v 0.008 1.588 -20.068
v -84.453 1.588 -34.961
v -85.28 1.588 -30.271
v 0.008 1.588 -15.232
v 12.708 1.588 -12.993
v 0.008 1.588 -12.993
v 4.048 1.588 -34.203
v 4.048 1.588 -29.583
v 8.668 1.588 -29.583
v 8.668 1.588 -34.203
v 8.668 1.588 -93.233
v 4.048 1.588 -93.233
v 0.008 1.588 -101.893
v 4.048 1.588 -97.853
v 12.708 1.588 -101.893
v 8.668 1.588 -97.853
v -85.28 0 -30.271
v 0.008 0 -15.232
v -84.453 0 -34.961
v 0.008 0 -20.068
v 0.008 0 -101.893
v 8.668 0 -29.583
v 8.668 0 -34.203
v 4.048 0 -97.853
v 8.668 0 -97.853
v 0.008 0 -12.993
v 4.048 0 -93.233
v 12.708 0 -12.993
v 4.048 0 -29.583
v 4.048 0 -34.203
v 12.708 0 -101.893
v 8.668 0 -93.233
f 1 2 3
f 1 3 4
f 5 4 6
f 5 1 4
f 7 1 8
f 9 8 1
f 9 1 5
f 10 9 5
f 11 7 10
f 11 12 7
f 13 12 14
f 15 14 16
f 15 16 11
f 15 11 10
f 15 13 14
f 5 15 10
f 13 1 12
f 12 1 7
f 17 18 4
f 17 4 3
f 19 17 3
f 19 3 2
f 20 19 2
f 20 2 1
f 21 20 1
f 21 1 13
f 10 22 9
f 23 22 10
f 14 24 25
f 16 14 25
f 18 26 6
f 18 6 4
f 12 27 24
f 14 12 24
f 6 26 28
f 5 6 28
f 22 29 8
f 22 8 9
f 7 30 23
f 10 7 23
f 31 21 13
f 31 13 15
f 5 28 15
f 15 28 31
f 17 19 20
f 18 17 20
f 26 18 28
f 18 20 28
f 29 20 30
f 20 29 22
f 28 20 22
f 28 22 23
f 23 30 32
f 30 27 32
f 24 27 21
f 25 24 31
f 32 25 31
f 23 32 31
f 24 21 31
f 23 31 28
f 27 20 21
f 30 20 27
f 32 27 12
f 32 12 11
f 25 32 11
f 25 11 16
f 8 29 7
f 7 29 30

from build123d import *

# Parameters (mm, degrees)
SKETCH1_W           = 12.7
SKETCH1_H           = 88.9
SKETCH1_W_2         = 4.62
SKETCH1_H_2         = 4.62
BOSS_EXTRUDE1_DEPTH = 1.5875
BOSS_EXTRUDE2_DEPTH = 1.5875


with BuildPart() as part:
    # Sketch1 → Boss-Extrude1 (new body)
    with BuildSketch(Plane(origin=(0, 0, 0), x_dir=(1, 0, 0), z_dir=(0, 1, 0))):
        with Locations((6.358064201, 57.44278115)):
            Rectangle(SKETCH1_W, SKETCH1_H)
        with Locations((6.358064201, 95.54278115)):
            Rectangle(SKETCH1_W_2, SKETCH1_H_2, mode=Mode.SUBTRACT)
        with Locations((6.358064201, 31.89278115)):
            Rectangle(SKETCH1_W_2, SKETCH1_H_2, mode=Mode.SUBTRACT)
    extrude(amount=BOSS_EXTRUDE1_DEPTH)

    # Sketch2 → Boss-Extrude2 (add)
    with BuildSketch(Plane.XZ):
        Polygon((0.008064201, -20.068103044), (0.008064201, -15.232133805), (-85.280307223, -30.270774828), (-84.453307777, -34.960921752), align=None)
    extrude(amount=-BOSS_EXTRUDE2_DEPTH)


solid = part.part
